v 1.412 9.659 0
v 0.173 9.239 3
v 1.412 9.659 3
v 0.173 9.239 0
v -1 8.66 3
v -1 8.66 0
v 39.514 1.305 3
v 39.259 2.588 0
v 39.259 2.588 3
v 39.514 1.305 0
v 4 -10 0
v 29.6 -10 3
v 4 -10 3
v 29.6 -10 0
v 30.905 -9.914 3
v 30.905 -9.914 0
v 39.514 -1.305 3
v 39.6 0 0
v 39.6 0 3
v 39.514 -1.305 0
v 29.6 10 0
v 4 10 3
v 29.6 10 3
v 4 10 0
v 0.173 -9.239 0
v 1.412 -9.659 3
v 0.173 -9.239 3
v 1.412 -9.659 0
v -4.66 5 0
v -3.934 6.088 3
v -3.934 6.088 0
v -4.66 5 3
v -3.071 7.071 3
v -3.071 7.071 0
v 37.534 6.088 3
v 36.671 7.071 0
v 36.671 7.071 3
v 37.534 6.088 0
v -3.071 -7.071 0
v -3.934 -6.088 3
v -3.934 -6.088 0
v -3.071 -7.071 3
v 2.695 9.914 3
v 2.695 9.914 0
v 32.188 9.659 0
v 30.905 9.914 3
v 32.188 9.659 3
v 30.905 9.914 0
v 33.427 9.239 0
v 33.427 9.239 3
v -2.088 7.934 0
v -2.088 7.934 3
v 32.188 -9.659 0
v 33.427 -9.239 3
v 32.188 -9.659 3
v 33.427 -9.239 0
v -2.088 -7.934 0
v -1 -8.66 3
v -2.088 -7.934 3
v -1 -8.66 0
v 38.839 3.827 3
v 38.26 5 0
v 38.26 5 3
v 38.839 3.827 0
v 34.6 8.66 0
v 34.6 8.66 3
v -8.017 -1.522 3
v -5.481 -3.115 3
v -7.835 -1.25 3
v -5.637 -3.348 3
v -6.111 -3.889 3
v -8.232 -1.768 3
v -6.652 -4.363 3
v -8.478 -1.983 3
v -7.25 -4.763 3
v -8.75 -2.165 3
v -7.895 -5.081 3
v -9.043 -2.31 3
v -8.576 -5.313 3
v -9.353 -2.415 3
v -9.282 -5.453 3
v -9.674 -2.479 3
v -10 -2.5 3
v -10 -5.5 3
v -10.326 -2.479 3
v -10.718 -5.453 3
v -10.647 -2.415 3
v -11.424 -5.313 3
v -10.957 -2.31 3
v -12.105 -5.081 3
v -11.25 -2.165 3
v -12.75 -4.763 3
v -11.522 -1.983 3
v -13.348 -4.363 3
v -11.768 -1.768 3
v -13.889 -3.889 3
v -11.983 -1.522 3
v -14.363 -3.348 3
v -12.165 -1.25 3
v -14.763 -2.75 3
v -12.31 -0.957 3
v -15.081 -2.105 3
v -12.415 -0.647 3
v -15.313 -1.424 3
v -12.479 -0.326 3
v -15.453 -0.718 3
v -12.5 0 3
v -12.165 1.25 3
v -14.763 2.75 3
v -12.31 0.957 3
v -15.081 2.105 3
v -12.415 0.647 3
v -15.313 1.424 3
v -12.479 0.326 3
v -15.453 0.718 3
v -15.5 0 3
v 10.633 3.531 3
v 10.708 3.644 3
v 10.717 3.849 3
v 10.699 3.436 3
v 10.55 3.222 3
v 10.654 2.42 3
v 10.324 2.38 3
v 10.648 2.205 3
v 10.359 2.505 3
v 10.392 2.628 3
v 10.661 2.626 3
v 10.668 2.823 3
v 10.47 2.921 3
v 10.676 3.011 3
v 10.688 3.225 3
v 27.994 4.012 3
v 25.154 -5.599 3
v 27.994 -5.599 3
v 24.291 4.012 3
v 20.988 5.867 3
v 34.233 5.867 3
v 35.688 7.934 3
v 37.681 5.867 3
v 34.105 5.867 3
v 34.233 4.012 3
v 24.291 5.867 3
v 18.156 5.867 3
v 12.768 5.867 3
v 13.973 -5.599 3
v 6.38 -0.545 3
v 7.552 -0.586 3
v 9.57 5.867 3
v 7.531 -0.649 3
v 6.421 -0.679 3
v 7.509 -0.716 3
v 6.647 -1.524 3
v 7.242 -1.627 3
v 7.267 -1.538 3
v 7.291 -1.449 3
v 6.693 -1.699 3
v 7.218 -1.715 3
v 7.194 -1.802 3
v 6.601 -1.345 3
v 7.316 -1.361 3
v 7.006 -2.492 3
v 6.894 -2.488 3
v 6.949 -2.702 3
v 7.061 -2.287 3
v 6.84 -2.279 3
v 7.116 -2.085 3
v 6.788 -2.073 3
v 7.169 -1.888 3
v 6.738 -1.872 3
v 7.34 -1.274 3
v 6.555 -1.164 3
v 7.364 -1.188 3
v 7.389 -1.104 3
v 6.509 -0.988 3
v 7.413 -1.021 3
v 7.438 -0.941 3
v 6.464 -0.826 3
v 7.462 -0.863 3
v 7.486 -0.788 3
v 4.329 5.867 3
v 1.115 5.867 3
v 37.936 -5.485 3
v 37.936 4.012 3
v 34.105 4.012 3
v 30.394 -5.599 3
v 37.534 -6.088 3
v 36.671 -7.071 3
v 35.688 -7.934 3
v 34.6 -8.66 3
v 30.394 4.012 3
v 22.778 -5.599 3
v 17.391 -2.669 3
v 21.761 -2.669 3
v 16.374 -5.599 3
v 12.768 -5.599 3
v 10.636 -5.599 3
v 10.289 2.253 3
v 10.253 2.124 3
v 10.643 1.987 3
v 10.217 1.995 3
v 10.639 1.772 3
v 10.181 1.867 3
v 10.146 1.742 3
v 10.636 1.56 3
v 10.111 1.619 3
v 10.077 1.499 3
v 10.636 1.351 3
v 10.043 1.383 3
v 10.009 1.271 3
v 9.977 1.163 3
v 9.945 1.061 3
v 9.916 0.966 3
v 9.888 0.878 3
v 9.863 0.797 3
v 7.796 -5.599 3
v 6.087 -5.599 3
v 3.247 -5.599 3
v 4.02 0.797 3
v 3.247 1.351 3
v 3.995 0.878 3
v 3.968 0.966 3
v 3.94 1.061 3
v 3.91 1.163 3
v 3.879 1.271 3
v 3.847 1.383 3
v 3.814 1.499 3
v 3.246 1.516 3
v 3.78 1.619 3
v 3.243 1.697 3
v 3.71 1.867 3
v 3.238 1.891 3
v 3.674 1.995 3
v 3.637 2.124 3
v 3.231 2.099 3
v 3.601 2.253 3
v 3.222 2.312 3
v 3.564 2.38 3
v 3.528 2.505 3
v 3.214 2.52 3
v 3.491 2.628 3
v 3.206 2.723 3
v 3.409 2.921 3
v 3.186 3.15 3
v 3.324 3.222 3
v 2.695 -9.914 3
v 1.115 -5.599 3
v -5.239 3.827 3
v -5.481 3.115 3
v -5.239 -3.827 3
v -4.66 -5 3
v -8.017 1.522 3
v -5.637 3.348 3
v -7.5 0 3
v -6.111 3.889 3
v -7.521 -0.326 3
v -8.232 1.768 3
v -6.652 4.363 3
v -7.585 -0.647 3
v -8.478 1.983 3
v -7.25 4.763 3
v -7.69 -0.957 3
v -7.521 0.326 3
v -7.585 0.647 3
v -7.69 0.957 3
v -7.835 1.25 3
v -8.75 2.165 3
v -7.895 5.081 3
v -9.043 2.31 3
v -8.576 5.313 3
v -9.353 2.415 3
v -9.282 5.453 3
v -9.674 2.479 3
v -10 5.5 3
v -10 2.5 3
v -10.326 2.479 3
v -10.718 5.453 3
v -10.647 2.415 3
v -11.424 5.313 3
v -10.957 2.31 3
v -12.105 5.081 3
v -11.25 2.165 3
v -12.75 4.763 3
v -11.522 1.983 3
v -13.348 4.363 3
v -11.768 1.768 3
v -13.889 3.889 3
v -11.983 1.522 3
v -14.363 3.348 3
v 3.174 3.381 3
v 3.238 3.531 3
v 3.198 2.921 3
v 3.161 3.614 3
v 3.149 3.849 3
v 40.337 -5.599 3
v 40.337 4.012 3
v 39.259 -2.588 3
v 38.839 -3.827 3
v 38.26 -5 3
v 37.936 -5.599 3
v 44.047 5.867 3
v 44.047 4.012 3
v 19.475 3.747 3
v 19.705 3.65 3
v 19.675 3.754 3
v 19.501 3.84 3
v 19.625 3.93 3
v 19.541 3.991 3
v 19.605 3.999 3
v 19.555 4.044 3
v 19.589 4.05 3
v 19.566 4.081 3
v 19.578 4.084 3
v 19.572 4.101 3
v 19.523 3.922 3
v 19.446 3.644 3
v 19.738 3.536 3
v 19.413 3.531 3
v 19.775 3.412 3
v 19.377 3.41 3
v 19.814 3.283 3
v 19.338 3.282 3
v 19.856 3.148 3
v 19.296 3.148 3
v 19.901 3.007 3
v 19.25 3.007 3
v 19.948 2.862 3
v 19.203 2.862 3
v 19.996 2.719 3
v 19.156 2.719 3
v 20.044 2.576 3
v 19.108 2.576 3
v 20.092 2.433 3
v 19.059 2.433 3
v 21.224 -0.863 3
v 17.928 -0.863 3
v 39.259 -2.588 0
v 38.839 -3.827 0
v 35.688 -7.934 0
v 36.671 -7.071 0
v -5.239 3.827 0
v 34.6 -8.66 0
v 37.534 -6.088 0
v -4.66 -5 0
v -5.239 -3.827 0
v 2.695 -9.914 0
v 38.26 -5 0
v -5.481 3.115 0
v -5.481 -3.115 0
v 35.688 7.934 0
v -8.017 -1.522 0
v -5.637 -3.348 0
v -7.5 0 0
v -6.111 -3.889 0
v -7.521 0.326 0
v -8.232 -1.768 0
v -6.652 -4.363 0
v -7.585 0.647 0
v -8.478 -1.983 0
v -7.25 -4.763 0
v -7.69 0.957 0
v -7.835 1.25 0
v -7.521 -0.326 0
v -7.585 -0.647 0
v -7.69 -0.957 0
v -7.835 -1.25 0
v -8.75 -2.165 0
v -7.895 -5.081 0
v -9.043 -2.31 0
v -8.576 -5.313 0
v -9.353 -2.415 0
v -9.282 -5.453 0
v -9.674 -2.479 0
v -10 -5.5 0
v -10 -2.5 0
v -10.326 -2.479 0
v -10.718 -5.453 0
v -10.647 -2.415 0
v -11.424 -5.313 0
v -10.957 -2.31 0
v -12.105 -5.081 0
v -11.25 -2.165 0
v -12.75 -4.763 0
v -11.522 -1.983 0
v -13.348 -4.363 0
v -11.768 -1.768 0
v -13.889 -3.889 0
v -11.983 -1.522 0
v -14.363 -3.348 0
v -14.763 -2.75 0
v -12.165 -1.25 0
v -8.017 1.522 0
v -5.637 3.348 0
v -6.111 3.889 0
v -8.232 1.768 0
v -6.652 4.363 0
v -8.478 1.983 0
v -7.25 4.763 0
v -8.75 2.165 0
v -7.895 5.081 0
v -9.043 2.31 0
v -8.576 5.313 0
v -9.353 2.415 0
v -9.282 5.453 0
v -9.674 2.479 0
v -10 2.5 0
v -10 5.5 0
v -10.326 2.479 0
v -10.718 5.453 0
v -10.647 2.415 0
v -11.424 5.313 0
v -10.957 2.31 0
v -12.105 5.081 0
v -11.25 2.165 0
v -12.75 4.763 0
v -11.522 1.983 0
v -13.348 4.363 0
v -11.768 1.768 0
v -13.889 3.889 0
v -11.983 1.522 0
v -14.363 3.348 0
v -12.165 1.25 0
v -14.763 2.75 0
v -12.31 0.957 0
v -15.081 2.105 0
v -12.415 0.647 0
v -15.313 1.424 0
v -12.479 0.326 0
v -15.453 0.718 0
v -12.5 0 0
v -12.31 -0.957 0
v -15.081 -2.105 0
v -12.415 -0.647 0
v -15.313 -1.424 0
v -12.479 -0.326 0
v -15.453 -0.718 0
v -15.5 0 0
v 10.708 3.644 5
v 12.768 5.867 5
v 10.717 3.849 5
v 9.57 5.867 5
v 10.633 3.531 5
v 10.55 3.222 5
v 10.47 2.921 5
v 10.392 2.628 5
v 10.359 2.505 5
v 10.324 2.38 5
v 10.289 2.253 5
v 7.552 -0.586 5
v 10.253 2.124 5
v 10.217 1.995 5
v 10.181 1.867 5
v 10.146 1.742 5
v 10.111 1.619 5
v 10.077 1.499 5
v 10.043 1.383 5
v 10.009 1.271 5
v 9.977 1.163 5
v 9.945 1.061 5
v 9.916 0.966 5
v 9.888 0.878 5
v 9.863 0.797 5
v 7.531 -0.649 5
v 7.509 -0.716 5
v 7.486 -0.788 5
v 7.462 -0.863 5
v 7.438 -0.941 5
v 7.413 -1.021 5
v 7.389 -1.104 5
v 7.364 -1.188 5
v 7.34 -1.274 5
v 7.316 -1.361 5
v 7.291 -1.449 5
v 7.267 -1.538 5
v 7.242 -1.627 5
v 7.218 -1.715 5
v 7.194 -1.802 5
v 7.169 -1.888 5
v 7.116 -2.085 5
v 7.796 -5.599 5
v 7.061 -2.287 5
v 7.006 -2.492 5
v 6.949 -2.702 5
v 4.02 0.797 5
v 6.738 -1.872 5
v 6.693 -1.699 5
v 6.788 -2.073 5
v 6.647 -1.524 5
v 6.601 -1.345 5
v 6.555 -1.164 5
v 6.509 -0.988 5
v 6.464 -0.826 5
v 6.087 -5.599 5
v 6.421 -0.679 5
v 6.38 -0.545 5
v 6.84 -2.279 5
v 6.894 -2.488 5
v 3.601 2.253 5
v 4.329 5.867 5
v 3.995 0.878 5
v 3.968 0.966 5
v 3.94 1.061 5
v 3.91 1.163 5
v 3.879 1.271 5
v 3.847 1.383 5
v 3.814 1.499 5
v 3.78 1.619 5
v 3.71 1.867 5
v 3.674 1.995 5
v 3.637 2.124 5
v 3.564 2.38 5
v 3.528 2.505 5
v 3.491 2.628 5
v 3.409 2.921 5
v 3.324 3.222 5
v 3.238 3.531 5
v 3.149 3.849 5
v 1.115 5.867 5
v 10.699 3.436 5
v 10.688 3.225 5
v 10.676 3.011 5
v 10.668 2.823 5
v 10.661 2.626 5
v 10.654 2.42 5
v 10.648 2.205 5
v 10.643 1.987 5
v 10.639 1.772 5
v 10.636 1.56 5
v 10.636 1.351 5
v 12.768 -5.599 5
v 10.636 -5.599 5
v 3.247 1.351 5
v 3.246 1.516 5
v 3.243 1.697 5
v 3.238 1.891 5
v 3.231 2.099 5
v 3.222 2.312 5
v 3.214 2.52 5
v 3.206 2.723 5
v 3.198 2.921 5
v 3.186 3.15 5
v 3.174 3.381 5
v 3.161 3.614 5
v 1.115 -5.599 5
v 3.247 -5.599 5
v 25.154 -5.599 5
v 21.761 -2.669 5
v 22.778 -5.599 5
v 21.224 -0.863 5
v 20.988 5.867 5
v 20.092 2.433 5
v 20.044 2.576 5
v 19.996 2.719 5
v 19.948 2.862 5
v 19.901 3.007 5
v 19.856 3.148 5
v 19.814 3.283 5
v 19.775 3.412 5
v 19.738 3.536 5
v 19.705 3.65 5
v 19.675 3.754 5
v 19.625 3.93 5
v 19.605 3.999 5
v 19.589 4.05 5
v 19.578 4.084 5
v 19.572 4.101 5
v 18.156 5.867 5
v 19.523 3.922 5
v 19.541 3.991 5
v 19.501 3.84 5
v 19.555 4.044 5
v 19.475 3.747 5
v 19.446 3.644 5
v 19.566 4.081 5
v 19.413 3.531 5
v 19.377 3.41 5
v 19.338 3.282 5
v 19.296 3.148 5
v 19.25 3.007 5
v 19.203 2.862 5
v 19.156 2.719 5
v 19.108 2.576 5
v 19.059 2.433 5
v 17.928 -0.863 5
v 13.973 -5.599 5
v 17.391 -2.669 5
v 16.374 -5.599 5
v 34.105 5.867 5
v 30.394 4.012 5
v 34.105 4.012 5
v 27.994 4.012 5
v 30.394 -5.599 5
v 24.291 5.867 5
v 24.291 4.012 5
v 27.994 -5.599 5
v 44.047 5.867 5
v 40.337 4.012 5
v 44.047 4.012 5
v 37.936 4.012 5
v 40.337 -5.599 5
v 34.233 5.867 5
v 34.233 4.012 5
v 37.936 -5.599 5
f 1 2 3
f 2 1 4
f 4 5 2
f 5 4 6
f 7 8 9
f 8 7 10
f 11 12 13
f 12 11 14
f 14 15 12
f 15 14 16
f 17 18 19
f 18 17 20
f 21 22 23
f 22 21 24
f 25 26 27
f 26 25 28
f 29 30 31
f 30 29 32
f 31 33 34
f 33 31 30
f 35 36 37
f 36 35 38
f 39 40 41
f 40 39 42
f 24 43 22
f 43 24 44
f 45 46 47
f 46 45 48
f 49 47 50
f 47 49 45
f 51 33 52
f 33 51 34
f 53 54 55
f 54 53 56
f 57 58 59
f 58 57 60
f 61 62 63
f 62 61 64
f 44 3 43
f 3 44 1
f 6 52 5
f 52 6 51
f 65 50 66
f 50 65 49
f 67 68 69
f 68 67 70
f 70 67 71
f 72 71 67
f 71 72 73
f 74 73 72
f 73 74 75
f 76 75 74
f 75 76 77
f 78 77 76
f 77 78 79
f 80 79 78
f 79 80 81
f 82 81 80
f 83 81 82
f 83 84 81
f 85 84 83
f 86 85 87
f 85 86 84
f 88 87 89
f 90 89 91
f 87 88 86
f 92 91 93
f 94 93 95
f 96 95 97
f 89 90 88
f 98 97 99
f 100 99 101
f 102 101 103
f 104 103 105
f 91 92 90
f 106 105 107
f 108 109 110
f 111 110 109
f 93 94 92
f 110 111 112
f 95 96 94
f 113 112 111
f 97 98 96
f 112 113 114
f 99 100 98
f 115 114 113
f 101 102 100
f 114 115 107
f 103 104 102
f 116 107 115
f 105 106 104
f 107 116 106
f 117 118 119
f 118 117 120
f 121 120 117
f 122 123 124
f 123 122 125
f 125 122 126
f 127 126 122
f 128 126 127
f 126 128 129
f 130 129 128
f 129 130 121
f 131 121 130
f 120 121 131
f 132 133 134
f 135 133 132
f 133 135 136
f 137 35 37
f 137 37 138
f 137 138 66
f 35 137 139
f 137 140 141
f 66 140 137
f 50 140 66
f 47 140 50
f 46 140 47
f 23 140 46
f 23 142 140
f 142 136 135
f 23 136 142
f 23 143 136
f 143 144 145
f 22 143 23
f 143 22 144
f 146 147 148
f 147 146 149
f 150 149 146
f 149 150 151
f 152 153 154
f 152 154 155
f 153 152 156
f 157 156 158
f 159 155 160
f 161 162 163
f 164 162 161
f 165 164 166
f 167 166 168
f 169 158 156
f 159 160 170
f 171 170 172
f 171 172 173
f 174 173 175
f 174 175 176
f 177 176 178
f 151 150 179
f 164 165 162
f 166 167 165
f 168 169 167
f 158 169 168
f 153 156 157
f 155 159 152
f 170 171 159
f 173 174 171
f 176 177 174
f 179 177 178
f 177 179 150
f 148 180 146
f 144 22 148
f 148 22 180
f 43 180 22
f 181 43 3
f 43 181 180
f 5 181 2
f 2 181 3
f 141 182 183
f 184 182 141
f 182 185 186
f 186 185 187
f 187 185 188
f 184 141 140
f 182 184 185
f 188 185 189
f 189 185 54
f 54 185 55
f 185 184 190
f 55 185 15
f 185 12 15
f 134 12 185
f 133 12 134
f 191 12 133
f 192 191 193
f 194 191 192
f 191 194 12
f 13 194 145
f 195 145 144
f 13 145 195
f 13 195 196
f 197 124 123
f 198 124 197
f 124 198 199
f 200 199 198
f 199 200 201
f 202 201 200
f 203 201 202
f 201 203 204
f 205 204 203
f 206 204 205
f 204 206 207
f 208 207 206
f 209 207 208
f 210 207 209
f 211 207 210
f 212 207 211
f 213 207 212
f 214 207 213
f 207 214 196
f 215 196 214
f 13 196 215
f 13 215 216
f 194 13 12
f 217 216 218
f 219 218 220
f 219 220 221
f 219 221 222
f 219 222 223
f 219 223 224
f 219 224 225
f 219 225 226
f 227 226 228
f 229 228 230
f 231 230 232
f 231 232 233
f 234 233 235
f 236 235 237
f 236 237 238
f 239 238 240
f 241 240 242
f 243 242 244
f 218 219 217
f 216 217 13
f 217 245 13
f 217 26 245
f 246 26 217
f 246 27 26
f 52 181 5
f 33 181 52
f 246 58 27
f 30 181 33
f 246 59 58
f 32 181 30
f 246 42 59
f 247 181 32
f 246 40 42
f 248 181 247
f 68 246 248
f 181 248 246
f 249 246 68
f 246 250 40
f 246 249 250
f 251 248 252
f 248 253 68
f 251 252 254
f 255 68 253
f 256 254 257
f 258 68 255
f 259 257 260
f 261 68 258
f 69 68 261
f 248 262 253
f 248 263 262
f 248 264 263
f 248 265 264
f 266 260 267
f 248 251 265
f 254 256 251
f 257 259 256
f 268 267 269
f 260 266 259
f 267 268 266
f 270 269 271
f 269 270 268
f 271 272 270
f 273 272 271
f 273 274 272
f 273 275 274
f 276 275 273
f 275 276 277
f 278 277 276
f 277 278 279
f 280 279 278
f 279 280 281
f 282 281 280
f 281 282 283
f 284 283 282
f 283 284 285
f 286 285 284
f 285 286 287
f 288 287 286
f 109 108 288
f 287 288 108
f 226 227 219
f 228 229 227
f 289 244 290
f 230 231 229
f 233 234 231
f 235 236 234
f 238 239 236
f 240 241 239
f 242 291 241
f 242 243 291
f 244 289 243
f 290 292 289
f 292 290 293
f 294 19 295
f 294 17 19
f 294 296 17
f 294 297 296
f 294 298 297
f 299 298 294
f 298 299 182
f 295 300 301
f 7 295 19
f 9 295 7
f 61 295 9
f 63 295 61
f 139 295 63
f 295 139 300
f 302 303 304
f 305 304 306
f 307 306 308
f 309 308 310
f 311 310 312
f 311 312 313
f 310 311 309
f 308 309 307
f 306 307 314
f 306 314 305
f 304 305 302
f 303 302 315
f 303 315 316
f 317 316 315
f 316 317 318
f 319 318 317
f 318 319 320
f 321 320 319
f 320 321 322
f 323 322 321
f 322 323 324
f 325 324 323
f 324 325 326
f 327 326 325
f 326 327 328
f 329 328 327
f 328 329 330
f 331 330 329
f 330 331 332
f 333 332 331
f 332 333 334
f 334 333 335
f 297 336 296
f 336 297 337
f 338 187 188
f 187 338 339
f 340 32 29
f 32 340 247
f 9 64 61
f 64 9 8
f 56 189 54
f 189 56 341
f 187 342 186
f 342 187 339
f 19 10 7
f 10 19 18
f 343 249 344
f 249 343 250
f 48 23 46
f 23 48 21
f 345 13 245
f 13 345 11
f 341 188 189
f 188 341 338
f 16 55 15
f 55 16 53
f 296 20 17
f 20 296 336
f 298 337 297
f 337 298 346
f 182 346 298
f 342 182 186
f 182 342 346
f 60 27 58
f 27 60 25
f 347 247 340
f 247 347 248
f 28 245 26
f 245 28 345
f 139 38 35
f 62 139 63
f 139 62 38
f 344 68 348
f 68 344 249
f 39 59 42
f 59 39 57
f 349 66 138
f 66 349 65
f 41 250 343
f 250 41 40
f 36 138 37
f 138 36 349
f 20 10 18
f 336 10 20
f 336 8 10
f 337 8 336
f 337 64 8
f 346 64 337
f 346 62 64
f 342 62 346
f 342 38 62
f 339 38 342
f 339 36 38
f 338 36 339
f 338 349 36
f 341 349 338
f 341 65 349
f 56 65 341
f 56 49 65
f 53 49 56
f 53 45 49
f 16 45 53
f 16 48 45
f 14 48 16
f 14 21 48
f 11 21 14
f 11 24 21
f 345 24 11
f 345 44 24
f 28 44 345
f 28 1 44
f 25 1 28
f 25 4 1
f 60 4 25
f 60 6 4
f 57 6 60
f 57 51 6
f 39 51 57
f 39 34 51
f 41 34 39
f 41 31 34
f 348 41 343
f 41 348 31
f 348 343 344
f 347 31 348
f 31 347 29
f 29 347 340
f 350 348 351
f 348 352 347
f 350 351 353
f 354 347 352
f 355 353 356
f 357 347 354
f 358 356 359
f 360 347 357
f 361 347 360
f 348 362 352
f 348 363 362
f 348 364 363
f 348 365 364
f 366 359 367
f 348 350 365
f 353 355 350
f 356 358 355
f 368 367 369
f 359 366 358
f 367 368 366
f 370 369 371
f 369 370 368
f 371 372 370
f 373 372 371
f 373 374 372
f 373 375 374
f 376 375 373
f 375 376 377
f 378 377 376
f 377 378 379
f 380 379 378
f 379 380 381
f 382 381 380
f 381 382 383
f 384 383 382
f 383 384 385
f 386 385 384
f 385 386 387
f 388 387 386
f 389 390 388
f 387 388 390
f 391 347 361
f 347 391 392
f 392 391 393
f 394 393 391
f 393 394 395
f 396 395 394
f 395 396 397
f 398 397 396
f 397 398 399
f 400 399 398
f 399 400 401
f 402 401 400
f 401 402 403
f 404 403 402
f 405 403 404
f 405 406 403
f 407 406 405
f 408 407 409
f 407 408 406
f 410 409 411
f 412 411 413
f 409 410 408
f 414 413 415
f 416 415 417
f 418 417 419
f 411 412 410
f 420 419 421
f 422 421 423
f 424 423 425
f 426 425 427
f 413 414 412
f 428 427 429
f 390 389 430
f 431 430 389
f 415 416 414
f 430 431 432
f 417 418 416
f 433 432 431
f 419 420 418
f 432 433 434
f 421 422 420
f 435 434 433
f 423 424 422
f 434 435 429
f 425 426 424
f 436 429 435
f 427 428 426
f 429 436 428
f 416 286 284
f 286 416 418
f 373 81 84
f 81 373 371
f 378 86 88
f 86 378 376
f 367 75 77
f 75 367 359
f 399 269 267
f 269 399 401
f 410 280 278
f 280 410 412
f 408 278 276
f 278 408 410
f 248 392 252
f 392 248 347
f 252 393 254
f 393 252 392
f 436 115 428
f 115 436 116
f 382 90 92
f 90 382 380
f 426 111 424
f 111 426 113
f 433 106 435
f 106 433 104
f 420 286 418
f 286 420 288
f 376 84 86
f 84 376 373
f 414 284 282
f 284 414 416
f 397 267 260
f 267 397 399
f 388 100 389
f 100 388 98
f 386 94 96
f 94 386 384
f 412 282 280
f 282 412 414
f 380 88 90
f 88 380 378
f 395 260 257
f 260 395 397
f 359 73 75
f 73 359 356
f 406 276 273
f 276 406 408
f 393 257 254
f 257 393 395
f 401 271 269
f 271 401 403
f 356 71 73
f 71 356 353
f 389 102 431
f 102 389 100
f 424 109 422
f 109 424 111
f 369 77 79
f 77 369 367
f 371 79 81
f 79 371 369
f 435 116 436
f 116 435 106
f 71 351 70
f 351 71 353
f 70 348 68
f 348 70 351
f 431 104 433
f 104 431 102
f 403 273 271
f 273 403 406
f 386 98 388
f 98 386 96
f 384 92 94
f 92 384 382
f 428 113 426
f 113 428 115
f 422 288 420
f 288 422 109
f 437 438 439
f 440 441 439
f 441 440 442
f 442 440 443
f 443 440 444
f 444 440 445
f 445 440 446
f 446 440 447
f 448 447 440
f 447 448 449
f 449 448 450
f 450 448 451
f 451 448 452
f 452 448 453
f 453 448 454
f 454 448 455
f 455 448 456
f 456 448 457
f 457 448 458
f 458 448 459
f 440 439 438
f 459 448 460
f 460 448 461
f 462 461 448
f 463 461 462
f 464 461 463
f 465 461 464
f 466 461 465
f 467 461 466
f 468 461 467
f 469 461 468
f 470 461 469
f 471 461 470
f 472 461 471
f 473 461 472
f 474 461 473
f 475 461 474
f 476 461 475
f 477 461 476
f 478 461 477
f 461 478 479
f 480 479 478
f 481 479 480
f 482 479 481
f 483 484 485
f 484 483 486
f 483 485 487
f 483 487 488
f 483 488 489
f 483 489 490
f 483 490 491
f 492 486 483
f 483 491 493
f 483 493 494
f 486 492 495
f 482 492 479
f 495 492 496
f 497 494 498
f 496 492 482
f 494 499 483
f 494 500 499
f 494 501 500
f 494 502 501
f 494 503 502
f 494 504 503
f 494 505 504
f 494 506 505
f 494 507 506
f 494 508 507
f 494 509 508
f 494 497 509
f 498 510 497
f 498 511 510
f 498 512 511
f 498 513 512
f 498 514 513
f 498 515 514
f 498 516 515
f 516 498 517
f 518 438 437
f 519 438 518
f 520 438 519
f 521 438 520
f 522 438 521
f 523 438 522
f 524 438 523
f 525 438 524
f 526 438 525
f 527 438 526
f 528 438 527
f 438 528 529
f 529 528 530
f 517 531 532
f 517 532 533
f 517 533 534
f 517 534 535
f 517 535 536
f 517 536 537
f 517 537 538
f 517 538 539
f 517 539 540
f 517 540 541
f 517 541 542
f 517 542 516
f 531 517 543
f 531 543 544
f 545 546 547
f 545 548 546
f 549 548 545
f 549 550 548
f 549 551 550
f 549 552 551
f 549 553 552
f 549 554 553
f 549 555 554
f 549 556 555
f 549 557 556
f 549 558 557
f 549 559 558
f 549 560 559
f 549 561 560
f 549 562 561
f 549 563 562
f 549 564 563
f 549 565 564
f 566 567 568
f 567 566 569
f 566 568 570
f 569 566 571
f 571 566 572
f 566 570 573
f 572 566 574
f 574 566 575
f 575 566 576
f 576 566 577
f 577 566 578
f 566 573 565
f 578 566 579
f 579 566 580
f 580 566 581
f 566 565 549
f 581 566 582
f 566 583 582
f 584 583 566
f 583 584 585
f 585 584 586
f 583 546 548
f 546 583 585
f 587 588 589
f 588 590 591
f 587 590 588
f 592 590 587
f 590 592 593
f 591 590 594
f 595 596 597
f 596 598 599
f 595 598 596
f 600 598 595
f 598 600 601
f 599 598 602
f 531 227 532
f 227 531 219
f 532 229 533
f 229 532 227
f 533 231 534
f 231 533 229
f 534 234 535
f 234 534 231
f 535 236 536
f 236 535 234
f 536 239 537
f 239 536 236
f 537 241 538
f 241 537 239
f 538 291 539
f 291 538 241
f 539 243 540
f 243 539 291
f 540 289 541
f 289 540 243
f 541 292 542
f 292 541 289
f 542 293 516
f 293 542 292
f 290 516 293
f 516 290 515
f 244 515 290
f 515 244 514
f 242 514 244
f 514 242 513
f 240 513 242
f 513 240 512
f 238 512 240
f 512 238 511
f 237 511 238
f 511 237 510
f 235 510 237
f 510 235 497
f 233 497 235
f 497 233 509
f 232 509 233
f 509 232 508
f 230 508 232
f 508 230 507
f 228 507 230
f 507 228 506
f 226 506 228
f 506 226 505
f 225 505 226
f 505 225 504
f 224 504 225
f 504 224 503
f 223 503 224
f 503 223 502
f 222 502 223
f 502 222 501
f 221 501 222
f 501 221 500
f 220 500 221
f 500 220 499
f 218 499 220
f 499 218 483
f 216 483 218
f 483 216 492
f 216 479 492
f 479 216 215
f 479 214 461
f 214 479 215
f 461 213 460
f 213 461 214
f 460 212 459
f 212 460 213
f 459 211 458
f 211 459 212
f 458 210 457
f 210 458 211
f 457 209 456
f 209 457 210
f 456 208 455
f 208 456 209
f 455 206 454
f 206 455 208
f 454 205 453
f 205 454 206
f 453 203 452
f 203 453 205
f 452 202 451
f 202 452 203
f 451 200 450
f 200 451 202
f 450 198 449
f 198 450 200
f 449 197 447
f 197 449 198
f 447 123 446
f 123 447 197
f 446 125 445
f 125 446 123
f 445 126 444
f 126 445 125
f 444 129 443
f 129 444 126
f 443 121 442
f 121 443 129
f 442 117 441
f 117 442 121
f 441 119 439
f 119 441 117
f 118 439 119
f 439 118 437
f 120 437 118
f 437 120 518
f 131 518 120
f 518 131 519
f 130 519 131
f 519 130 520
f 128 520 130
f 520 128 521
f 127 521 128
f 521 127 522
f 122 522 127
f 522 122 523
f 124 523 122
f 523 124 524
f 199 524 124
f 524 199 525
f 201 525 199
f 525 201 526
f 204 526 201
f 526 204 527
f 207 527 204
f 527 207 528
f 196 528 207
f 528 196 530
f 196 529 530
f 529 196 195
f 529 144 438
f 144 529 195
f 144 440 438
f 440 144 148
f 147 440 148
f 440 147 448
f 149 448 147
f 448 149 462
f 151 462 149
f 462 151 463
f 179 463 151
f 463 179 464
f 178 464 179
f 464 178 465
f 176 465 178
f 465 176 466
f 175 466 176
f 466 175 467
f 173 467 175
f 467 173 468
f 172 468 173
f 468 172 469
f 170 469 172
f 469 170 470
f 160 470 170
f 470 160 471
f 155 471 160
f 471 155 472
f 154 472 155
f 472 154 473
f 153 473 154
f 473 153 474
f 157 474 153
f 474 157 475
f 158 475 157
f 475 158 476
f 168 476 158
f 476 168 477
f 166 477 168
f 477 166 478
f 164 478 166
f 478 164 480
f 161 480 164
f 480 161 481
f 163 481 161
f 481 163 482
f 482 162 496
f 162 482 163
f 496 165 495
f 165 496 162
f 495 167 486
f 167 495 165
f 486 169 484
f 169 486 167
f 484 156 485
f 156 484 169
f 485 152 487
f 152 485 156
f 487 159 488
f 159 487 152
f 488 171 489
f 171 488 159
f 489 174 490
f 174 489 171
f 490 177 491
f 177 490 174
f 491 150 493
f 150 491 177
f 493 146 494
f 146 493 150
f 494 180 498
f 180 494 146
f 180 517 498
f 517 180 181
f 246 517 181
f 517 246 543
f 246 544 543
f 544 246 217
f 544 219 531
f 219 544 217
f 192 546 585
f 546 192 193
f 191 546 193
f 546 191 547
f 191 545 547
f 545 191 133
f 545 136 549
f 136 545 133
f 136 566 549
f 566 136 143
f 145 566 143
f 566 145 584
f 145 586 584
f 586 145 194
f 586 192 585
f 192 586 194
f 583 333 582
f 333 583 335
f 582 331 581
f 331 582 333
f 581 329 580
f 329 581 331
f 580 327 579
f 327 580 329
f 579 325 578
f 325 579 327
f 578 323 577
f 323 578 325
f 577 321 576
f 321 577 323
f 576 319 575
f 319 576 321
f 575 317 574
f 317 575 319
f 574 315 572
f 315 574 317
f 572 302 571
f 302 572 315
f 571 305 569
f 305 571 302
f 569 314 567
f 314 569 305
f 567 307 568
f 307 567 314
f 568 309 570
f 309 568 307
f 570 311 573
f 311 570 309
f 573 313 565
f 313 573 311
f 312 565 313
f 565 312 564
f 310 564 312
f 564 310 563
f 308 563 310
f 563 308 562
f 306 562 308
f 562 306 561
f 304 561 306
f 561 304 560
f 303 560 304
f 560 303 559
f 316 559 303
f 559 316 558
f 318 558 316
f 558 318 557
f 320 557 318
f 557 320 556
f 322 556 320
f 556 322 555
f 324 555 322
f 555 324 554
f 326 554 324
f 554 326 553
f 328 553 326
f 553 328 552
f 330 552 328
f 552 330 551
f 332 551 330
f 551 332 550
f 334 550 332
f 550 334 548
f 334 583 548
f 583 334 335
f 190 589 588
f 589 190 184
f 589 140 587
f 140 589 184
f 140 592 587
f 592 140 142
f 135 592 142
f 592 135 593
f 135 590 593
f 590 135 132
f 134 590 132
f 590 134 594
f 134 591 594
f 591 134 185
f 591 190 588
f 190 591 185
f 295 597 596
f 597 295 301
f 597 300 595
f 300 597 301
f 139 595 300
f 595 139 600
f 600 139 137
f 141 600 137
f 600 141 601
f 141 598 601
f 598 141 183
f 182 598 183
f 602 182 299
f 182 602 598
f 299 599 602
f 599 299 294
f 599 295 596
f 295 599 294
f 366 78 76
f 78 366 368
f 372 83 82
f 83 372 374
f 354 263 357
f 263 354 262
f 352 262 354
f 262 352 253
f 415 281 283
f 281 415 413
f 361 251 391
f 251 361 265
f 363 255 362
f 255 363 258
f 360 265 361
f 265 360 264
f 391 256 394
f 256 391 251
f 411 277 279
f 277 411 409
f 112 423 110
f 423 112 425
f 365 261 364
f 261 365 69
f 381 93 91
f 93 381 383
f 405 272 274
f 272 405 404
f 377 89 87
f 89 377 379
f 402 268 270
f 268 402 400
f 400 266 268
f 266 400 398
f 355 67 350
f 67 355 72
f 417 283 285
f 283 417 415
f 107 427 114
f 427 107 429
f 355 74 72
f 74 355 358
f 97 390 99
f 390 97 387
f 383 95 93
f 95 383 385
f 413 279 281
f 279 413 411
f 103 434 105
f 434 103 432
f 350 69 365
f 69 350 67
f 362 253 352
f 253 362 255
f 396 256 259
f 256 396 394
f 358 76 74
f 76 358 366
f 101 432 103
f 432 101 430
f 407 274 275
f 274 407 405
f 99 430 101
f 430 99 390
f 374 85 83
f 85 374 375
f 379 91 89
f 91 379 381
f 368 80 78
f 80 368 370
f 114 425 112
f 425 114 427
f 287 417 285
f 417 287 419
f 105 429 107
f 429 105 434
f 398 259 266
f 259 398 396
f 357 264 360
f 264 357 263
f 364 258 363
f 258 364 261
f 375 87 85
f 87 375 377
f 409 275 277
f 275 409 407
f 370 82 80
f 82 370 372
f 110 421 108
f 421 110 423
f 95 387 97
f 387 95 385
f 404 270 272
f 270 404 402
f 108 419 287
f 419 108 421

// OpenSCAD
// ============================================================
// NAME KEYCHAIN — your first code-CAD project
// ============================================================
// Change the line below, press F5, and watch. That's coding CAD.
//
// Print: flat side down, no supports, ~15 min.
// Multi-color: in Bambu Studio, color-paint the letters a
// different color than the base (they stick up, easy to select).
// ============================================================

// ------------ CHANGE THESE ------------
name        = "MATT";   // <-- your name here
font_size   = 12;       // letter height in mm
base_height = 3;        // thickness of the base plate
text_height = 2;        // how far letters stick up
ring_hole   = 5;        // keyring hole diameter in mm
// ---------------------------------------

font    = "Liberation Sans:style=Bold";
padding = 4;            // base border around the letters

// A rough width estimate so the base auto-fits the name.
// (Letters average ~0.7x their size in width for this font.
//  If your letters poke past the edge, raise 0.70 a little.)
text_w = len(name) * font_size * 0.70;

// ---- the base plate: a rounded bar + a ring for the keyring ----
module base() {
    hull() {
        translate([padding, 0, 0])
            cylinder(h = base_height, r = font_size/2 + padding, $fn = 48);
        translate([text_w - padding, 0, 0])
            cylinder(h = base_height, r = font_size/2 + padding, $fn = 48);
    }
    // keyring loop on the left
    translate([-font_size/2 - padding, 0, 0])
        cylinder(h = base_height, r = ring_hole/2 + 3, $fn = 48);
}

difference() {
    union() {
        base();
        // ---- the name, raised on top ----
        translate([0, 0, base_height])
            linear_extrude(text_height)
                text(name, size = font_size, font = font,
                     halign = "left", valign = "center");
    }
    // ---- the keyring hole ----
    translate([-font_size/2 - padding, 0, -1])
        cylinder(h = base_height + text_height + 2, r = ring_hole/2, $fn = 48);
}

// IDEAS TO TRY (or ask Claude):
//  - a heart or soccer ball instead of the ring circle
//  - two-line text (hint: a second text() moved with translate)
//  - emboss INTO the base instead of raising up (hint: difference)
